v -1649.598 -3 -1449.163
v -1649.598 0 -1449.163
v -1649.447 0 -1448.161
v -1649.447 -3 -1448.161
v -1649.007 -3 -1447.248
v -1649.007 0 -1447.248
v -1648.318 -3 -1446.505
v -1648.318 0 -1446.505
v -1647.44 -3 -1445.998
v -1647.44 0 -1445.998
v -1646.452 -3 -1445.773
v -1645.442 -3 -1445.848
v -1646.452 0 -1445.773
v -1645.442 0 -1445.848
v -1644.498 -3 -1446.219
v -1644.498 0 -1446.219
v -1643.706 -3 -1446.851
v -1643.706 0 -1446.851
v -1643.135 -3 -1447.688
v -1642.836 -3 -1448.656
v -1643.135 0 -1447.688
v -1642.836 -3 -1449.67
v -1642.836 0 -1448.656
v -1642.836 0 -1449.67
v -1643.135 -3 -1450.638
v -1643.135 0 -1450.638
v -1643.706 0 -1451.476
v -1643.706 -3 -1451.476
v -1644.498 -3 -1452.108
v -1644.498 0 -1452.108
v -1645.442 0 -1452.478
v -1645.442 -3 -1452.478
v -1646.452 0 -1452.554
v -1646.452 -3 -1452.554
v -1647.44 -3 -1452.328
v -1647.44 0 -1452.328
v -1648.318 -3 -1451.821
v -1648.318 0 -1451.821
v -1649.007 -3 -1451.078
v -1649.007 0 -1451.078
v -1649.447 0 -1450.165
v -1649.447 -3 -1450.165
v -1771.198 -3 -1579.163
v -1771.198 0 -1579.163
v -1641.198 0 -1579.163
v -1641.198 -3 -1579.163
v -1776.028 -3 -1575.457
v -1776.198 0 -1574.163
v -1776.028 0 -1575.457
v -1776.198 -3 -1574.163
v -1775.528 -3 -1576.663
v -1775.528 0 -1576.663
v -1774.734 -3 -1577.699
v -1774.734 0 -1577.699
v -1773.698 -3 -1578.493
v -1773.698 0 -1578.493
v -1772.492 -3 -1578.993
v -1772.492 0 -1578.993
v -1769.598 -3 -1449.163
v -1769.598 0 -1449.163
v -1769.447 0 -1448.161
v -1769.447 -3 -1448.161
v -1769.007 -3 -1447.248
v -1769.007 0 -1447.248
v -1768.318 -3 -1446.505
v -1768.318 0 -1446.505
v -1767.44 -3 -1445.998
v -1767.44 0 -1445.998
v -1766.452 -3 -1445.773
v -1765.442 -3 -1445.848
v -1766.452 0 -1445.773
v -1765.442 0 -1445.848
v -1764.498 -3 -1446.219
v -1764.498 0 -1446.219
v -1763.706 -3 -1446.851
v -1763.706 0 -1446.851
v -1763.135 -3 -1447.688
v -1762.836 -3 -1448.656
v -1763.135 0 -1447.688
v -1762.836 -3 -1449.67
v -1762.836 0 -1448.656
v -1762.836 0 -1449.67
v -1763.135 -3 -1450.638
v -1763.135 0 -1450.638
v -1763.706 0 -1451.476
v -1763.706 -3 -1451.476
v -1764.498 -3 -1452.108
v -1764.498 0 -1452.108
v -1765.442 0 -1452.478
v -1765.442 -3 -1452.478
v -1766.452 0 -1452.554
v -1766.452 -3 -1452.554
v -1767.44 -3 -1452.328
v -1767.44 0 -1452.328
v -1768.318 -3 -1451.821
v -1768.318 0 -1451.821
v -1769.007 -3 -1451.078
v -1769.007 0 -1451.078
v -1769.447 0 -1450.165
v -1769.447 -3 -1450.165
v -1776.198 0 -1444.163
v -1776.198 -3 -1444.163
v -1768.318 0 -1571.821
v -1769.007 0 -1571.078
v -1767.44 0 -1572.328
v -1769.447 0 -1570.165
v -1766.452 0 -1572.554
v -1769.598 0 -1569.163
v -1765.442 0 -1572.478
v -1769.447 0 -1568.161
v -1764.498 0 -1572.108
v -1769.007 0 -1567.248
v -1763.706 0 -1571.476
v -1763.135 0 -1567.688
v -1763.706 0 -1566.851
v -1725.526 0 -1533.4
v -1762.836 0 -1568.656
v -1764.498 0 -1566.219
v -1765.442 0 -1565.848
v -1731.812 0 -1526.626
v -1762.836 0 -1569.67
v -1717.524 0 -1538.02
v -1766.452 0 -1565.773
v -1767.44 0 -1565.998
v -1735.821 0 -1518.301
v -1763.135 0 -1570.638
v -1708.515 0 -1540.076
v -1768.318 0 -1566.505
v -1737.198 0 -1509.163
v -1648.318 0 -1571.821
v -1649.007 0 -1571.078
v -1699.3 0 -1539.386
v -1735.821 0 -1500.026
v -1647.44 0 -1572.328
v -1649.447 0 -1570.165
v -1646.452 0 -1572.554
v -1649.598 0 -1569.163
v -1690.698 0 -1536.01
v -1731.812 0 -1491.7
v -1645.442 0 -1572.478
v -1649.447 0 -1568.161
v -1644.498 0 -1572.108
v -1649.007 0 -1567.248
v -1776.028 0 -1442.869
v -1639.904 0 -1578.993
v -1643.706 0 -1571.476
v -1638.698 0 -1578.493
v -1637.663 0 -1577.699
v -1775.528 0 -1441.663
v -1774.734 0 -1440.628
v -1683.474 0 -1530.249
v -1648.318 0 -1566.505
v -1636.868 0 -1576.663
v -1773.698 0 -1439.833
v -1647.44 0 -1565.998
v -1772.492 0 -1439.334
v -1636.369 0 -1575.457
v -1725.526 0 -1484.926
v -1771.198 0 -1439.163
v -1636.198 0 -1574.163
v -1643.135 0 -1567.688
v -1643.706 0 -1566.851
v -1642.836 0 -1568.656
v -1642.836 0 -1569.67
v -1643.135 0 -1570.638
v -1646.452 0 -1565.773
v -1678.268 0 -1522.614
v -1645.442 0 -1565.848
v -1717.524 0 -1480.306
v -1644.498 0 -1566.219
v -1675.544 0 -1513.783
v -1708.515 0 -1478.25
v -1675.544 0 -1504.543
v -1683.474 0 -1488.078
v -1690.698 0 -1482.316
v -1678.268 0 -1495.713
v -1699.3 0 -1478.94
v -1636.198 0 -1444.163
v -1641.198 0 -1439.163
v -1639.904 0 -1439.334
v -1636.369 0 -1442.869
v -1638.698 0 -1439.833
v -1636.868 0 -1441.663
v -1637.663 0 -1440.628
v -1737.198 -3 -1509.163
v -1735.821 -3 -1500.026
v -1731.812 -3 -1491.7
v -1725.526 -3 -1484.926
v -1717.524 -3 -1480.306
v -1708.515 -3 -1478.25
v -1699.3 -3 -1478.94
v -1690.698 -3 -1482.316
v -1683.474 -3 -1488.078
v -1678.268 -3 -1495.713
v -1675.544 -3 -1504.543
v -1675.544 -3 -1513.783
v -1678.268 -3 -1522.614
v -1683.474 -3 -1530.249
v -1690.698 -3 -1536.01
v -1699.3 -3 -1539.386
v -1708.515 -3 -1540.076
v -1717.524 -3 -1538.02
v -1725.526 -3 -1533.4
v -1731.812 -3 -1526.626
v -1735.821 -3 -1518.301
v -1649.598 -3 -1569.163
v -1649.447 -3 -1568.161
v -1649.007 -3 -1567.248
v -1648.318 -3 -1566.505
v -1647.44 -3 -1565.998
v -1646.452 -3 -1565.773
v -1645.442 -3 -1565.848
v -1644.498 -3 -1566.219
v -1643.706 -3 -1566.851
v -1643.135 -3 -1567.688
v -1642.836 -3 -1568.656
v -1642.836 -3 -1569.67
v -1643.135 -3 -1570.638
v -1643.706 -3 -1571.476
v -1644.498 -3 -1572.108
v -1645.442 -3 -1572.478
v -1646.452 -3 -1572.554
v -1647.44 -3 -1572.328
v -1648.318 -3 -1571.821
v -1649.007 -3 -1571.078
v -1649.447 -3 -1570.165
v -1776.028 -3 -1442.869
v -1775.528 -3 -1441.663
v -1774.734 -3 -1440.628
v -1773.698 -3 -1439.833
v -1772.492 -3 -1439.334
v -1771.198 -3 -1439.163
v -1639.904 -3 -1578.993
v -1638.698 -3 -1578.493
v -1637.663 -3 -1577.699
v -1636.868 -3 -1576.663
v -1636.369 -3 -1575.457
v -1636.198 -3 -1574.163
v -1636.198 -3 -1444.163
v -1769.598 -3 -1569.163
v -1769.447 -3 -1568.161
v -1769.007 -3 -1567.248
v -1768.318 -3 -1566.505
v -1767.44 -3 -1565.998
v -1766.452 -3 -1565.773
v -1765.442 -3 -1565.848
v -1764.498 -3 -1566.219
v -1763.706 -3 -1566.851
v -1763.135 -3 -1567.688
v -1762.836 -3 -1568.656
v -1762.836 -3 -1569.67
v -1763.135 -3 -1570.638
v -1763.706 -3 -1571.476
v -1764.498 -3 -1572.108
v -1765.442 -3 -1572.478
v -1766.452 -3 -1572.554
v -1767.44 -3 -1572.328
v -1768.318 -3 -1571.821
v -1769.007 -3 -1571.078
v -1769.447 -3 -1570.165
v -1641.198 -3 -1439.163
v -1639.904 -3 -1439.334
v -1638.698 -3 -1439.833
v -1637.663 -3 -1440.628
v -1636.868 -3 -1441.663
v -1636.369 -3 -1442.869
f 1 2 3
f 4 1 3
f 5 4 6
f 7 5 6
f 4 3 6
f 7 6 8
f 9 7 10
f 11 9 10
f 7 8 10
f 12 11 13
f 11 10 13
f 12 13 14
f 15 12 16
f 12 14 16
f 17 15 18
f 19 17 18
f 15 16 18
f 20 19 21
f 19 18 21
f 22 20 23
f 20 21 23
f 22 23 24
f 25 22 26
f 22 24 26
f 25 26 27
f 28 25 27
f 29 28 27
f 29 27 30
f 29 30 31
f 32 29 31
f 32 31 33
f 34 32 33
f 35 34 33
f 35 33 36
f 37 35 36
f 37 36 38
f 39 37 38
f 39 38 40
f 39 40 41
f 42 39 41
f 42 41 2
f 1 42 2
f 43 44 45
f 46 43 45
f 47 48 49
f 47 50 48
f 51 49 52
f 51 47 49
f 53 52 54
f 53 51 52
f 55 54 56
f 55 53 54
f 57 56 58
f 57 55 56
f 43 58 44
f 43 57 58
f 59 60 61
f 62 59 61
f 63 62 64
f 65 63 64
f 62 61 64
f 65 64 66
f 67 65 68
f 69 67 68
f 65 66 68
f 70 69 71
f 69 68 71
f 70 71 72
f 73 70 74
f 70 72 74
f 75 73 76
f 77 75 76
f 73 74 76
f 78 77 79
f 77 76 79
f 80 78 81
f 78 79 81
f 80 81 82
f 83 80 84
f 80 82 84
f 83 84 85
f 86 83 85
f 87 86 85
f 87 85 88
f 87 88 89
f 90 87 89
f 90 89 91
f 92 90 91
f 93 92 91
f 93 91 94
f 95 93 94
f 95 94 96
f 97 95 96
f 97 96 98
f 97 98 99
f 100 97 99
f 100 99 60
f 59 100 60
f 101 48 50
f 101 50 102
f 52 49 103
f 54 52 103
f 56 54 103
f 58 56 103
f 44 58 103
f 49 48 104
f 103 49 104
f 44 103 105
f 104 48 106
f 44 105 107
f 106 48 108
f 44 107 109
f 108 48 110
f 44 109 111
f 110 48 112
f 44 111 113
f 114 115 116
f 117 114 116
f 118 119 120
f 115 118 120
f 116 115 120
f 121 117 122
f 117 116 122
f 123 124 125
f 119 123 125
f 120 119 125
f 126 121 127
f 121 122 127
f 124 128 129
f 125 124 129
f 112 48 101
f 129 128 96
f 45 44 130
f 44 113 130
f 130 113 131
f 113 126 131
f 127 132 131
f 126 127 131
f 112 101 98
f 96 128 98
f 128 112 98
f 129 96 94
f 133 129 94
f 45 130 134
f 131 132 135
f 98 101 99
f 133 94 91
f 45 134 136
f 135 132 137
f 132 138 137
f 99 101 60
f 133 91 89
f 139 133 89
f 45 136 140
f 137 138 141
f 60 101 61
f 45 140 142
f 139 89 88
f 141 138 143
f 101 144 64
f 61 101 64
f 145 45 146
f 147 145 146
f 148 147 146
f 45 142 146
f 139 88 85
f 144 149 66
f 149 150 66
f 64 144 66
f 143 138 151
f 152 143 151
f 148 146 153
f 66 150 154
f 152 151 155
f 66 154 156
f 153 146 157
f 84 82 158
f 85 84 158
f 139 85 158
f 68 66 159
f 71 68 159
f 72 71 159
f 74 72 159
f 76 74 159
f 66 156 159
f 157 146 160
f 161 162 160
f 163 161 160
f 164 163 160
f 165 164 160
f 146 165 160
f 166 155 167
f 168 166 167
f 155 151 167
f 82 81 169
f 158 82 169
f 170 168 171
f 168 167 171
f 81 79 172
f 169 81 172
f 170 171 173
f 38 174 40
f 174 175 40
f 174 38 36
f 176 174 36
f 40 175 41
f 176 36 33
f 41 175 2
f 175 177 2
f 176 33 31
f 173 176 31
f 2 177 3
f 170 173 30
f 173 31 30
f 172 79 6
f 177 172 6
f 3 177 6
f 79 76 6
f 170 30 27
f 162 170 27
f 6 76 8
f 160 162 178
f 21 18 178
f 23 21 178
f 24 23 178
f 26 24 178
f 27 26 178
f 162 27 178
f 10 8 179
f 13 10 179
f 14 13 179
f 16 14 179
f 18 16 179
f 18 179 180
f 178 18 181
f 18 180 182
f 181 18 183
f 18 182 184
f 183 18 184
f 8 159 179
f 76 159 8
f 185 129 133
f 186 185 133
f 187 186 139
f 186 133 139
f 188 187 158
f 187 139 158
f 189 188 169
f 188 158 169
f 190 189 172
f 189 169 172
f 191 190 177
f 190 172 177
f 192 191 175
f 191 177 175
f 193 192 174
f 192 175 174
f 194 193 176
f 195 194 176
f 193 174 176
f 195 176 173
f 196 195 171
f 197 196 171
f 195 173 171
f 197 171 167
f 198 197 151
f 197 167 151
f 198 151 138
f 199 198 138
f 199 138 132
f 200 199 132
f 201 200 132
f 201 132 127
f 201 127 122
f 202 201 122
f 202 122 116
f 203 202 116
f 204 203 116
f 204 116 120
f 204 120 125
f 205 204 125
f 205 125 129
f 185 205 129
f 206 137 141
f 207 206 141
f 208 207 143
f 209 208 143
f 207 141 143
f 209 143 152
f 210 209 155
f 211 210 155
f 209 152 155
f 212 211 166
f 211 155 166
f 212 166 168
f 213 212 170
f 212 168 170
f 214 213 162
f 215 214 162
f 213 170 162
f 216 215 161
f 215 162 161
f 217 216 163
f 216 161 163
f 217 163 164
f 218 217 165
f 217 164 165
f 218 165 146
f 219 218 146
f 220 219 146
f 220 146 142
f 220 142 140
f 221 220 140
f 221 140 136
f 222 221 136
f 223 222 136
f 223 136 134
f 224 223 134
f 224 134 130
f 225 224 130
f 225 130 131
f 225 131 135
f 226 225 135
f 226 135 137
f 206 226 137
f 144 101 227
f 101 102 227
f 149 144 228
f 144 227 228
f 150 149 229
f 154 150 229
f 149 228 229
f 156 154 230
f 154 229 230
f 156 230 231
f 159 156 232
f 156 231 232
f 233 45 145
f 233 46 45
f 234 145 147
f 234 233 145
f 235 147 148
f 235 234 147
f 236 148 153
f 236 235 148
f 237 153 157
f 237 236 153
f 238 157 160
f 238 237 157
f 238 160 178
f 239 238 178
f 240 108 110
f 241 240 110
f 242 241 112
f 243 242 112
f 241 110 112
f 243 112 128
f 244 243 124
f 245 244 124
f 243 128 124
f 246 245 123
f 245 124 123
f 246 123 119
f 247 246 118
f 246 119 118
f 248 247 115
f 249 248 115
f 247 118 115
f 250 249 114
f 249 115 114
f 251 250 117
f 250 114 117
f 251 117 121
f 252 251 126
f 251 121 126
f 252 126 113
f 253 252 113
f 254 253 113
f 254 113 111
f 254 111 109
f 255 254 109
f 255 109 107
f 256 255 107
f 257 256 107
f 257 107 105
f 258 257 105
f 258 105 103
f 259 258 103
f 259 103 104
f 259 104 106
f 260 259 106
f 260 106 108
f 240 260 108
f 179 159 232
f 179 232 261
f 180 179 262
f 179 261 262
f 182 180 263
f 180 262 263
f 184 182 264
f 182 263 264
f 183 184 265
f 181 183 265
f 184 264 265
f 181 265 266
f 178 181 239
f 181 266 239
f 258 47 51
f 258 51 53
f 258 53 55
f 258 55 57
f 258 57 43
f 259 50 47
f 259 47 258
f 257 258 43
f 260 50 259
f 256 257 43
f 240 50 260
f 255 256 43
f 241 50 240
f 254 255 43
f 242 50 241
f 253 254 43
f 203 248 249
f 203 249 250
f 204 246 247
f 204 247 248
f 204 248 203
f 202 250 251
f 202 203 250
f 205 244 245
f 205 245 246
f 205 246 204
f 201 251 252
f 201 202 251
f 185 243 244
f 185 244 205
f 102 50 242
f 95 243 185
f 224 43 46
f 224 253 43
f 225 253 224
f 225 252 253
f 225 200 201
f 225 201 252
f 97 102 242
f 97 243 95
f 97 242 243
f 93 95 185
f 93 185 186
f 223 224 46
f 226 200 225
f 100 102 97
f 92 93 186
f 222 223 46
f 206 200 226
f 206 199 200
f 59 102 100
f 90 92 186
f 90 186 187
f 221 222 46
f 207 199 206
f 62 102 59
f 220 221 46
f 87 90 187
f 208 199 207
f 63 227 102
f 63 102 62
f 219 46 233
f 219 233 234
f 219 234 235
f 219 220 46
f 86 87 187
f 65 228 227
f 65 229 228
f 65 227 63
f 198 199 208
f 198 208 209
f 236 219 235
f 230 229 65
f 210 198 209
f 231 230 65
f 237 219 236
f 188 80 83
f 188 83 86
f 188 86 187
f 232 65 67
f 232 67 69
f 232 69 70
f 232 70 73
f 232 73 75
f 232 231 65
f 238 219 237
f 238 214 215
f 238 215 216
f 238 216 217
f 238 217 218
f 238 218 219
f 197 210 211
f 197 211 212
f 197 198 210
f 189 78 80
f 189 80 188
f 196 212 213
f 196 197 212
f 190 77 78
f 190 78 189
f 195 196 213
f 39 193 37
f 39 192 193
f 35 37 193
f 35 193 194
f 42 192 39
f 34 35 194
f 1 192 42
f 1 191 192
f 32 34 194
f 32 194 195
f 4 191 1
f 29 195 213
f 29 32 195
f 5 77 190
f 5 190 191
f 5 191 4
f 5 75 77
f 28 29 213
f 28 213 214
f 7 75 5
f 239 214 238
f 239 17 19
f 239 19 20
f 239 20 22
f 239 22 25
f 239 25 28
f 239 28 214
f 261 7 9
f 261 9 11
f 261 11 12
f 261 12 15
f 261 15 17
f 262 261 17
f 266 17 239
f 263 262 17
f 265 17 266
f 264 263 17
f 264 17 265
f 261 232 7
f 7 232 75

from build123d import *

# Parameters (mm, degrees)
F0_W     = 140
F0_H     = 140
F1_DEPTH = 3
F3_D     = 6.8
F3_DEPTH = 10
F4_R     = 5
F6_D     = 62
F6_DEPTH = 10


with BuildPart() as f1:
    # F0 (on Front) → F1 (new body)
    with BuildSketch(Plane.XZ):
        with Locations((-1706.19823, -1509.163168)):
            Rectangle(F0_W, F0_H)
    extrude(amount=F1_DEPTH)

    # F3
    with Locations(Plane.XZ.offset(3)):
        with Locations((-1766.19823, -1449.163168), (-1646.19823, -1449.163168), (-1646.19823, -1569.163168), (-1766.19823, -1569.163168)):
            Hole(F3_D / 2, depth=F3_DEPTH)

    # F4
    f4_edges = [f1.edges().sort_by_distance(p)[0] for p in [
        (-1636.19823, -1.5, -1439.163168),
        (-1636.19823, -1.5, -1579.163168),
        (-1776.19823, -1.5, -1439.163168),
        (-1776.19823, -1.5, -1579.163168),
    ]]
    fillet(f4_edges, radius=F4_R)

    # F6
    with Locations(Plane.XZ.offset(3)):
        with Locations((-1706.19823, -1509.163168)):
            Hole(F6_D / 2, depth=F6_DEPTH)


solid = f1.part
